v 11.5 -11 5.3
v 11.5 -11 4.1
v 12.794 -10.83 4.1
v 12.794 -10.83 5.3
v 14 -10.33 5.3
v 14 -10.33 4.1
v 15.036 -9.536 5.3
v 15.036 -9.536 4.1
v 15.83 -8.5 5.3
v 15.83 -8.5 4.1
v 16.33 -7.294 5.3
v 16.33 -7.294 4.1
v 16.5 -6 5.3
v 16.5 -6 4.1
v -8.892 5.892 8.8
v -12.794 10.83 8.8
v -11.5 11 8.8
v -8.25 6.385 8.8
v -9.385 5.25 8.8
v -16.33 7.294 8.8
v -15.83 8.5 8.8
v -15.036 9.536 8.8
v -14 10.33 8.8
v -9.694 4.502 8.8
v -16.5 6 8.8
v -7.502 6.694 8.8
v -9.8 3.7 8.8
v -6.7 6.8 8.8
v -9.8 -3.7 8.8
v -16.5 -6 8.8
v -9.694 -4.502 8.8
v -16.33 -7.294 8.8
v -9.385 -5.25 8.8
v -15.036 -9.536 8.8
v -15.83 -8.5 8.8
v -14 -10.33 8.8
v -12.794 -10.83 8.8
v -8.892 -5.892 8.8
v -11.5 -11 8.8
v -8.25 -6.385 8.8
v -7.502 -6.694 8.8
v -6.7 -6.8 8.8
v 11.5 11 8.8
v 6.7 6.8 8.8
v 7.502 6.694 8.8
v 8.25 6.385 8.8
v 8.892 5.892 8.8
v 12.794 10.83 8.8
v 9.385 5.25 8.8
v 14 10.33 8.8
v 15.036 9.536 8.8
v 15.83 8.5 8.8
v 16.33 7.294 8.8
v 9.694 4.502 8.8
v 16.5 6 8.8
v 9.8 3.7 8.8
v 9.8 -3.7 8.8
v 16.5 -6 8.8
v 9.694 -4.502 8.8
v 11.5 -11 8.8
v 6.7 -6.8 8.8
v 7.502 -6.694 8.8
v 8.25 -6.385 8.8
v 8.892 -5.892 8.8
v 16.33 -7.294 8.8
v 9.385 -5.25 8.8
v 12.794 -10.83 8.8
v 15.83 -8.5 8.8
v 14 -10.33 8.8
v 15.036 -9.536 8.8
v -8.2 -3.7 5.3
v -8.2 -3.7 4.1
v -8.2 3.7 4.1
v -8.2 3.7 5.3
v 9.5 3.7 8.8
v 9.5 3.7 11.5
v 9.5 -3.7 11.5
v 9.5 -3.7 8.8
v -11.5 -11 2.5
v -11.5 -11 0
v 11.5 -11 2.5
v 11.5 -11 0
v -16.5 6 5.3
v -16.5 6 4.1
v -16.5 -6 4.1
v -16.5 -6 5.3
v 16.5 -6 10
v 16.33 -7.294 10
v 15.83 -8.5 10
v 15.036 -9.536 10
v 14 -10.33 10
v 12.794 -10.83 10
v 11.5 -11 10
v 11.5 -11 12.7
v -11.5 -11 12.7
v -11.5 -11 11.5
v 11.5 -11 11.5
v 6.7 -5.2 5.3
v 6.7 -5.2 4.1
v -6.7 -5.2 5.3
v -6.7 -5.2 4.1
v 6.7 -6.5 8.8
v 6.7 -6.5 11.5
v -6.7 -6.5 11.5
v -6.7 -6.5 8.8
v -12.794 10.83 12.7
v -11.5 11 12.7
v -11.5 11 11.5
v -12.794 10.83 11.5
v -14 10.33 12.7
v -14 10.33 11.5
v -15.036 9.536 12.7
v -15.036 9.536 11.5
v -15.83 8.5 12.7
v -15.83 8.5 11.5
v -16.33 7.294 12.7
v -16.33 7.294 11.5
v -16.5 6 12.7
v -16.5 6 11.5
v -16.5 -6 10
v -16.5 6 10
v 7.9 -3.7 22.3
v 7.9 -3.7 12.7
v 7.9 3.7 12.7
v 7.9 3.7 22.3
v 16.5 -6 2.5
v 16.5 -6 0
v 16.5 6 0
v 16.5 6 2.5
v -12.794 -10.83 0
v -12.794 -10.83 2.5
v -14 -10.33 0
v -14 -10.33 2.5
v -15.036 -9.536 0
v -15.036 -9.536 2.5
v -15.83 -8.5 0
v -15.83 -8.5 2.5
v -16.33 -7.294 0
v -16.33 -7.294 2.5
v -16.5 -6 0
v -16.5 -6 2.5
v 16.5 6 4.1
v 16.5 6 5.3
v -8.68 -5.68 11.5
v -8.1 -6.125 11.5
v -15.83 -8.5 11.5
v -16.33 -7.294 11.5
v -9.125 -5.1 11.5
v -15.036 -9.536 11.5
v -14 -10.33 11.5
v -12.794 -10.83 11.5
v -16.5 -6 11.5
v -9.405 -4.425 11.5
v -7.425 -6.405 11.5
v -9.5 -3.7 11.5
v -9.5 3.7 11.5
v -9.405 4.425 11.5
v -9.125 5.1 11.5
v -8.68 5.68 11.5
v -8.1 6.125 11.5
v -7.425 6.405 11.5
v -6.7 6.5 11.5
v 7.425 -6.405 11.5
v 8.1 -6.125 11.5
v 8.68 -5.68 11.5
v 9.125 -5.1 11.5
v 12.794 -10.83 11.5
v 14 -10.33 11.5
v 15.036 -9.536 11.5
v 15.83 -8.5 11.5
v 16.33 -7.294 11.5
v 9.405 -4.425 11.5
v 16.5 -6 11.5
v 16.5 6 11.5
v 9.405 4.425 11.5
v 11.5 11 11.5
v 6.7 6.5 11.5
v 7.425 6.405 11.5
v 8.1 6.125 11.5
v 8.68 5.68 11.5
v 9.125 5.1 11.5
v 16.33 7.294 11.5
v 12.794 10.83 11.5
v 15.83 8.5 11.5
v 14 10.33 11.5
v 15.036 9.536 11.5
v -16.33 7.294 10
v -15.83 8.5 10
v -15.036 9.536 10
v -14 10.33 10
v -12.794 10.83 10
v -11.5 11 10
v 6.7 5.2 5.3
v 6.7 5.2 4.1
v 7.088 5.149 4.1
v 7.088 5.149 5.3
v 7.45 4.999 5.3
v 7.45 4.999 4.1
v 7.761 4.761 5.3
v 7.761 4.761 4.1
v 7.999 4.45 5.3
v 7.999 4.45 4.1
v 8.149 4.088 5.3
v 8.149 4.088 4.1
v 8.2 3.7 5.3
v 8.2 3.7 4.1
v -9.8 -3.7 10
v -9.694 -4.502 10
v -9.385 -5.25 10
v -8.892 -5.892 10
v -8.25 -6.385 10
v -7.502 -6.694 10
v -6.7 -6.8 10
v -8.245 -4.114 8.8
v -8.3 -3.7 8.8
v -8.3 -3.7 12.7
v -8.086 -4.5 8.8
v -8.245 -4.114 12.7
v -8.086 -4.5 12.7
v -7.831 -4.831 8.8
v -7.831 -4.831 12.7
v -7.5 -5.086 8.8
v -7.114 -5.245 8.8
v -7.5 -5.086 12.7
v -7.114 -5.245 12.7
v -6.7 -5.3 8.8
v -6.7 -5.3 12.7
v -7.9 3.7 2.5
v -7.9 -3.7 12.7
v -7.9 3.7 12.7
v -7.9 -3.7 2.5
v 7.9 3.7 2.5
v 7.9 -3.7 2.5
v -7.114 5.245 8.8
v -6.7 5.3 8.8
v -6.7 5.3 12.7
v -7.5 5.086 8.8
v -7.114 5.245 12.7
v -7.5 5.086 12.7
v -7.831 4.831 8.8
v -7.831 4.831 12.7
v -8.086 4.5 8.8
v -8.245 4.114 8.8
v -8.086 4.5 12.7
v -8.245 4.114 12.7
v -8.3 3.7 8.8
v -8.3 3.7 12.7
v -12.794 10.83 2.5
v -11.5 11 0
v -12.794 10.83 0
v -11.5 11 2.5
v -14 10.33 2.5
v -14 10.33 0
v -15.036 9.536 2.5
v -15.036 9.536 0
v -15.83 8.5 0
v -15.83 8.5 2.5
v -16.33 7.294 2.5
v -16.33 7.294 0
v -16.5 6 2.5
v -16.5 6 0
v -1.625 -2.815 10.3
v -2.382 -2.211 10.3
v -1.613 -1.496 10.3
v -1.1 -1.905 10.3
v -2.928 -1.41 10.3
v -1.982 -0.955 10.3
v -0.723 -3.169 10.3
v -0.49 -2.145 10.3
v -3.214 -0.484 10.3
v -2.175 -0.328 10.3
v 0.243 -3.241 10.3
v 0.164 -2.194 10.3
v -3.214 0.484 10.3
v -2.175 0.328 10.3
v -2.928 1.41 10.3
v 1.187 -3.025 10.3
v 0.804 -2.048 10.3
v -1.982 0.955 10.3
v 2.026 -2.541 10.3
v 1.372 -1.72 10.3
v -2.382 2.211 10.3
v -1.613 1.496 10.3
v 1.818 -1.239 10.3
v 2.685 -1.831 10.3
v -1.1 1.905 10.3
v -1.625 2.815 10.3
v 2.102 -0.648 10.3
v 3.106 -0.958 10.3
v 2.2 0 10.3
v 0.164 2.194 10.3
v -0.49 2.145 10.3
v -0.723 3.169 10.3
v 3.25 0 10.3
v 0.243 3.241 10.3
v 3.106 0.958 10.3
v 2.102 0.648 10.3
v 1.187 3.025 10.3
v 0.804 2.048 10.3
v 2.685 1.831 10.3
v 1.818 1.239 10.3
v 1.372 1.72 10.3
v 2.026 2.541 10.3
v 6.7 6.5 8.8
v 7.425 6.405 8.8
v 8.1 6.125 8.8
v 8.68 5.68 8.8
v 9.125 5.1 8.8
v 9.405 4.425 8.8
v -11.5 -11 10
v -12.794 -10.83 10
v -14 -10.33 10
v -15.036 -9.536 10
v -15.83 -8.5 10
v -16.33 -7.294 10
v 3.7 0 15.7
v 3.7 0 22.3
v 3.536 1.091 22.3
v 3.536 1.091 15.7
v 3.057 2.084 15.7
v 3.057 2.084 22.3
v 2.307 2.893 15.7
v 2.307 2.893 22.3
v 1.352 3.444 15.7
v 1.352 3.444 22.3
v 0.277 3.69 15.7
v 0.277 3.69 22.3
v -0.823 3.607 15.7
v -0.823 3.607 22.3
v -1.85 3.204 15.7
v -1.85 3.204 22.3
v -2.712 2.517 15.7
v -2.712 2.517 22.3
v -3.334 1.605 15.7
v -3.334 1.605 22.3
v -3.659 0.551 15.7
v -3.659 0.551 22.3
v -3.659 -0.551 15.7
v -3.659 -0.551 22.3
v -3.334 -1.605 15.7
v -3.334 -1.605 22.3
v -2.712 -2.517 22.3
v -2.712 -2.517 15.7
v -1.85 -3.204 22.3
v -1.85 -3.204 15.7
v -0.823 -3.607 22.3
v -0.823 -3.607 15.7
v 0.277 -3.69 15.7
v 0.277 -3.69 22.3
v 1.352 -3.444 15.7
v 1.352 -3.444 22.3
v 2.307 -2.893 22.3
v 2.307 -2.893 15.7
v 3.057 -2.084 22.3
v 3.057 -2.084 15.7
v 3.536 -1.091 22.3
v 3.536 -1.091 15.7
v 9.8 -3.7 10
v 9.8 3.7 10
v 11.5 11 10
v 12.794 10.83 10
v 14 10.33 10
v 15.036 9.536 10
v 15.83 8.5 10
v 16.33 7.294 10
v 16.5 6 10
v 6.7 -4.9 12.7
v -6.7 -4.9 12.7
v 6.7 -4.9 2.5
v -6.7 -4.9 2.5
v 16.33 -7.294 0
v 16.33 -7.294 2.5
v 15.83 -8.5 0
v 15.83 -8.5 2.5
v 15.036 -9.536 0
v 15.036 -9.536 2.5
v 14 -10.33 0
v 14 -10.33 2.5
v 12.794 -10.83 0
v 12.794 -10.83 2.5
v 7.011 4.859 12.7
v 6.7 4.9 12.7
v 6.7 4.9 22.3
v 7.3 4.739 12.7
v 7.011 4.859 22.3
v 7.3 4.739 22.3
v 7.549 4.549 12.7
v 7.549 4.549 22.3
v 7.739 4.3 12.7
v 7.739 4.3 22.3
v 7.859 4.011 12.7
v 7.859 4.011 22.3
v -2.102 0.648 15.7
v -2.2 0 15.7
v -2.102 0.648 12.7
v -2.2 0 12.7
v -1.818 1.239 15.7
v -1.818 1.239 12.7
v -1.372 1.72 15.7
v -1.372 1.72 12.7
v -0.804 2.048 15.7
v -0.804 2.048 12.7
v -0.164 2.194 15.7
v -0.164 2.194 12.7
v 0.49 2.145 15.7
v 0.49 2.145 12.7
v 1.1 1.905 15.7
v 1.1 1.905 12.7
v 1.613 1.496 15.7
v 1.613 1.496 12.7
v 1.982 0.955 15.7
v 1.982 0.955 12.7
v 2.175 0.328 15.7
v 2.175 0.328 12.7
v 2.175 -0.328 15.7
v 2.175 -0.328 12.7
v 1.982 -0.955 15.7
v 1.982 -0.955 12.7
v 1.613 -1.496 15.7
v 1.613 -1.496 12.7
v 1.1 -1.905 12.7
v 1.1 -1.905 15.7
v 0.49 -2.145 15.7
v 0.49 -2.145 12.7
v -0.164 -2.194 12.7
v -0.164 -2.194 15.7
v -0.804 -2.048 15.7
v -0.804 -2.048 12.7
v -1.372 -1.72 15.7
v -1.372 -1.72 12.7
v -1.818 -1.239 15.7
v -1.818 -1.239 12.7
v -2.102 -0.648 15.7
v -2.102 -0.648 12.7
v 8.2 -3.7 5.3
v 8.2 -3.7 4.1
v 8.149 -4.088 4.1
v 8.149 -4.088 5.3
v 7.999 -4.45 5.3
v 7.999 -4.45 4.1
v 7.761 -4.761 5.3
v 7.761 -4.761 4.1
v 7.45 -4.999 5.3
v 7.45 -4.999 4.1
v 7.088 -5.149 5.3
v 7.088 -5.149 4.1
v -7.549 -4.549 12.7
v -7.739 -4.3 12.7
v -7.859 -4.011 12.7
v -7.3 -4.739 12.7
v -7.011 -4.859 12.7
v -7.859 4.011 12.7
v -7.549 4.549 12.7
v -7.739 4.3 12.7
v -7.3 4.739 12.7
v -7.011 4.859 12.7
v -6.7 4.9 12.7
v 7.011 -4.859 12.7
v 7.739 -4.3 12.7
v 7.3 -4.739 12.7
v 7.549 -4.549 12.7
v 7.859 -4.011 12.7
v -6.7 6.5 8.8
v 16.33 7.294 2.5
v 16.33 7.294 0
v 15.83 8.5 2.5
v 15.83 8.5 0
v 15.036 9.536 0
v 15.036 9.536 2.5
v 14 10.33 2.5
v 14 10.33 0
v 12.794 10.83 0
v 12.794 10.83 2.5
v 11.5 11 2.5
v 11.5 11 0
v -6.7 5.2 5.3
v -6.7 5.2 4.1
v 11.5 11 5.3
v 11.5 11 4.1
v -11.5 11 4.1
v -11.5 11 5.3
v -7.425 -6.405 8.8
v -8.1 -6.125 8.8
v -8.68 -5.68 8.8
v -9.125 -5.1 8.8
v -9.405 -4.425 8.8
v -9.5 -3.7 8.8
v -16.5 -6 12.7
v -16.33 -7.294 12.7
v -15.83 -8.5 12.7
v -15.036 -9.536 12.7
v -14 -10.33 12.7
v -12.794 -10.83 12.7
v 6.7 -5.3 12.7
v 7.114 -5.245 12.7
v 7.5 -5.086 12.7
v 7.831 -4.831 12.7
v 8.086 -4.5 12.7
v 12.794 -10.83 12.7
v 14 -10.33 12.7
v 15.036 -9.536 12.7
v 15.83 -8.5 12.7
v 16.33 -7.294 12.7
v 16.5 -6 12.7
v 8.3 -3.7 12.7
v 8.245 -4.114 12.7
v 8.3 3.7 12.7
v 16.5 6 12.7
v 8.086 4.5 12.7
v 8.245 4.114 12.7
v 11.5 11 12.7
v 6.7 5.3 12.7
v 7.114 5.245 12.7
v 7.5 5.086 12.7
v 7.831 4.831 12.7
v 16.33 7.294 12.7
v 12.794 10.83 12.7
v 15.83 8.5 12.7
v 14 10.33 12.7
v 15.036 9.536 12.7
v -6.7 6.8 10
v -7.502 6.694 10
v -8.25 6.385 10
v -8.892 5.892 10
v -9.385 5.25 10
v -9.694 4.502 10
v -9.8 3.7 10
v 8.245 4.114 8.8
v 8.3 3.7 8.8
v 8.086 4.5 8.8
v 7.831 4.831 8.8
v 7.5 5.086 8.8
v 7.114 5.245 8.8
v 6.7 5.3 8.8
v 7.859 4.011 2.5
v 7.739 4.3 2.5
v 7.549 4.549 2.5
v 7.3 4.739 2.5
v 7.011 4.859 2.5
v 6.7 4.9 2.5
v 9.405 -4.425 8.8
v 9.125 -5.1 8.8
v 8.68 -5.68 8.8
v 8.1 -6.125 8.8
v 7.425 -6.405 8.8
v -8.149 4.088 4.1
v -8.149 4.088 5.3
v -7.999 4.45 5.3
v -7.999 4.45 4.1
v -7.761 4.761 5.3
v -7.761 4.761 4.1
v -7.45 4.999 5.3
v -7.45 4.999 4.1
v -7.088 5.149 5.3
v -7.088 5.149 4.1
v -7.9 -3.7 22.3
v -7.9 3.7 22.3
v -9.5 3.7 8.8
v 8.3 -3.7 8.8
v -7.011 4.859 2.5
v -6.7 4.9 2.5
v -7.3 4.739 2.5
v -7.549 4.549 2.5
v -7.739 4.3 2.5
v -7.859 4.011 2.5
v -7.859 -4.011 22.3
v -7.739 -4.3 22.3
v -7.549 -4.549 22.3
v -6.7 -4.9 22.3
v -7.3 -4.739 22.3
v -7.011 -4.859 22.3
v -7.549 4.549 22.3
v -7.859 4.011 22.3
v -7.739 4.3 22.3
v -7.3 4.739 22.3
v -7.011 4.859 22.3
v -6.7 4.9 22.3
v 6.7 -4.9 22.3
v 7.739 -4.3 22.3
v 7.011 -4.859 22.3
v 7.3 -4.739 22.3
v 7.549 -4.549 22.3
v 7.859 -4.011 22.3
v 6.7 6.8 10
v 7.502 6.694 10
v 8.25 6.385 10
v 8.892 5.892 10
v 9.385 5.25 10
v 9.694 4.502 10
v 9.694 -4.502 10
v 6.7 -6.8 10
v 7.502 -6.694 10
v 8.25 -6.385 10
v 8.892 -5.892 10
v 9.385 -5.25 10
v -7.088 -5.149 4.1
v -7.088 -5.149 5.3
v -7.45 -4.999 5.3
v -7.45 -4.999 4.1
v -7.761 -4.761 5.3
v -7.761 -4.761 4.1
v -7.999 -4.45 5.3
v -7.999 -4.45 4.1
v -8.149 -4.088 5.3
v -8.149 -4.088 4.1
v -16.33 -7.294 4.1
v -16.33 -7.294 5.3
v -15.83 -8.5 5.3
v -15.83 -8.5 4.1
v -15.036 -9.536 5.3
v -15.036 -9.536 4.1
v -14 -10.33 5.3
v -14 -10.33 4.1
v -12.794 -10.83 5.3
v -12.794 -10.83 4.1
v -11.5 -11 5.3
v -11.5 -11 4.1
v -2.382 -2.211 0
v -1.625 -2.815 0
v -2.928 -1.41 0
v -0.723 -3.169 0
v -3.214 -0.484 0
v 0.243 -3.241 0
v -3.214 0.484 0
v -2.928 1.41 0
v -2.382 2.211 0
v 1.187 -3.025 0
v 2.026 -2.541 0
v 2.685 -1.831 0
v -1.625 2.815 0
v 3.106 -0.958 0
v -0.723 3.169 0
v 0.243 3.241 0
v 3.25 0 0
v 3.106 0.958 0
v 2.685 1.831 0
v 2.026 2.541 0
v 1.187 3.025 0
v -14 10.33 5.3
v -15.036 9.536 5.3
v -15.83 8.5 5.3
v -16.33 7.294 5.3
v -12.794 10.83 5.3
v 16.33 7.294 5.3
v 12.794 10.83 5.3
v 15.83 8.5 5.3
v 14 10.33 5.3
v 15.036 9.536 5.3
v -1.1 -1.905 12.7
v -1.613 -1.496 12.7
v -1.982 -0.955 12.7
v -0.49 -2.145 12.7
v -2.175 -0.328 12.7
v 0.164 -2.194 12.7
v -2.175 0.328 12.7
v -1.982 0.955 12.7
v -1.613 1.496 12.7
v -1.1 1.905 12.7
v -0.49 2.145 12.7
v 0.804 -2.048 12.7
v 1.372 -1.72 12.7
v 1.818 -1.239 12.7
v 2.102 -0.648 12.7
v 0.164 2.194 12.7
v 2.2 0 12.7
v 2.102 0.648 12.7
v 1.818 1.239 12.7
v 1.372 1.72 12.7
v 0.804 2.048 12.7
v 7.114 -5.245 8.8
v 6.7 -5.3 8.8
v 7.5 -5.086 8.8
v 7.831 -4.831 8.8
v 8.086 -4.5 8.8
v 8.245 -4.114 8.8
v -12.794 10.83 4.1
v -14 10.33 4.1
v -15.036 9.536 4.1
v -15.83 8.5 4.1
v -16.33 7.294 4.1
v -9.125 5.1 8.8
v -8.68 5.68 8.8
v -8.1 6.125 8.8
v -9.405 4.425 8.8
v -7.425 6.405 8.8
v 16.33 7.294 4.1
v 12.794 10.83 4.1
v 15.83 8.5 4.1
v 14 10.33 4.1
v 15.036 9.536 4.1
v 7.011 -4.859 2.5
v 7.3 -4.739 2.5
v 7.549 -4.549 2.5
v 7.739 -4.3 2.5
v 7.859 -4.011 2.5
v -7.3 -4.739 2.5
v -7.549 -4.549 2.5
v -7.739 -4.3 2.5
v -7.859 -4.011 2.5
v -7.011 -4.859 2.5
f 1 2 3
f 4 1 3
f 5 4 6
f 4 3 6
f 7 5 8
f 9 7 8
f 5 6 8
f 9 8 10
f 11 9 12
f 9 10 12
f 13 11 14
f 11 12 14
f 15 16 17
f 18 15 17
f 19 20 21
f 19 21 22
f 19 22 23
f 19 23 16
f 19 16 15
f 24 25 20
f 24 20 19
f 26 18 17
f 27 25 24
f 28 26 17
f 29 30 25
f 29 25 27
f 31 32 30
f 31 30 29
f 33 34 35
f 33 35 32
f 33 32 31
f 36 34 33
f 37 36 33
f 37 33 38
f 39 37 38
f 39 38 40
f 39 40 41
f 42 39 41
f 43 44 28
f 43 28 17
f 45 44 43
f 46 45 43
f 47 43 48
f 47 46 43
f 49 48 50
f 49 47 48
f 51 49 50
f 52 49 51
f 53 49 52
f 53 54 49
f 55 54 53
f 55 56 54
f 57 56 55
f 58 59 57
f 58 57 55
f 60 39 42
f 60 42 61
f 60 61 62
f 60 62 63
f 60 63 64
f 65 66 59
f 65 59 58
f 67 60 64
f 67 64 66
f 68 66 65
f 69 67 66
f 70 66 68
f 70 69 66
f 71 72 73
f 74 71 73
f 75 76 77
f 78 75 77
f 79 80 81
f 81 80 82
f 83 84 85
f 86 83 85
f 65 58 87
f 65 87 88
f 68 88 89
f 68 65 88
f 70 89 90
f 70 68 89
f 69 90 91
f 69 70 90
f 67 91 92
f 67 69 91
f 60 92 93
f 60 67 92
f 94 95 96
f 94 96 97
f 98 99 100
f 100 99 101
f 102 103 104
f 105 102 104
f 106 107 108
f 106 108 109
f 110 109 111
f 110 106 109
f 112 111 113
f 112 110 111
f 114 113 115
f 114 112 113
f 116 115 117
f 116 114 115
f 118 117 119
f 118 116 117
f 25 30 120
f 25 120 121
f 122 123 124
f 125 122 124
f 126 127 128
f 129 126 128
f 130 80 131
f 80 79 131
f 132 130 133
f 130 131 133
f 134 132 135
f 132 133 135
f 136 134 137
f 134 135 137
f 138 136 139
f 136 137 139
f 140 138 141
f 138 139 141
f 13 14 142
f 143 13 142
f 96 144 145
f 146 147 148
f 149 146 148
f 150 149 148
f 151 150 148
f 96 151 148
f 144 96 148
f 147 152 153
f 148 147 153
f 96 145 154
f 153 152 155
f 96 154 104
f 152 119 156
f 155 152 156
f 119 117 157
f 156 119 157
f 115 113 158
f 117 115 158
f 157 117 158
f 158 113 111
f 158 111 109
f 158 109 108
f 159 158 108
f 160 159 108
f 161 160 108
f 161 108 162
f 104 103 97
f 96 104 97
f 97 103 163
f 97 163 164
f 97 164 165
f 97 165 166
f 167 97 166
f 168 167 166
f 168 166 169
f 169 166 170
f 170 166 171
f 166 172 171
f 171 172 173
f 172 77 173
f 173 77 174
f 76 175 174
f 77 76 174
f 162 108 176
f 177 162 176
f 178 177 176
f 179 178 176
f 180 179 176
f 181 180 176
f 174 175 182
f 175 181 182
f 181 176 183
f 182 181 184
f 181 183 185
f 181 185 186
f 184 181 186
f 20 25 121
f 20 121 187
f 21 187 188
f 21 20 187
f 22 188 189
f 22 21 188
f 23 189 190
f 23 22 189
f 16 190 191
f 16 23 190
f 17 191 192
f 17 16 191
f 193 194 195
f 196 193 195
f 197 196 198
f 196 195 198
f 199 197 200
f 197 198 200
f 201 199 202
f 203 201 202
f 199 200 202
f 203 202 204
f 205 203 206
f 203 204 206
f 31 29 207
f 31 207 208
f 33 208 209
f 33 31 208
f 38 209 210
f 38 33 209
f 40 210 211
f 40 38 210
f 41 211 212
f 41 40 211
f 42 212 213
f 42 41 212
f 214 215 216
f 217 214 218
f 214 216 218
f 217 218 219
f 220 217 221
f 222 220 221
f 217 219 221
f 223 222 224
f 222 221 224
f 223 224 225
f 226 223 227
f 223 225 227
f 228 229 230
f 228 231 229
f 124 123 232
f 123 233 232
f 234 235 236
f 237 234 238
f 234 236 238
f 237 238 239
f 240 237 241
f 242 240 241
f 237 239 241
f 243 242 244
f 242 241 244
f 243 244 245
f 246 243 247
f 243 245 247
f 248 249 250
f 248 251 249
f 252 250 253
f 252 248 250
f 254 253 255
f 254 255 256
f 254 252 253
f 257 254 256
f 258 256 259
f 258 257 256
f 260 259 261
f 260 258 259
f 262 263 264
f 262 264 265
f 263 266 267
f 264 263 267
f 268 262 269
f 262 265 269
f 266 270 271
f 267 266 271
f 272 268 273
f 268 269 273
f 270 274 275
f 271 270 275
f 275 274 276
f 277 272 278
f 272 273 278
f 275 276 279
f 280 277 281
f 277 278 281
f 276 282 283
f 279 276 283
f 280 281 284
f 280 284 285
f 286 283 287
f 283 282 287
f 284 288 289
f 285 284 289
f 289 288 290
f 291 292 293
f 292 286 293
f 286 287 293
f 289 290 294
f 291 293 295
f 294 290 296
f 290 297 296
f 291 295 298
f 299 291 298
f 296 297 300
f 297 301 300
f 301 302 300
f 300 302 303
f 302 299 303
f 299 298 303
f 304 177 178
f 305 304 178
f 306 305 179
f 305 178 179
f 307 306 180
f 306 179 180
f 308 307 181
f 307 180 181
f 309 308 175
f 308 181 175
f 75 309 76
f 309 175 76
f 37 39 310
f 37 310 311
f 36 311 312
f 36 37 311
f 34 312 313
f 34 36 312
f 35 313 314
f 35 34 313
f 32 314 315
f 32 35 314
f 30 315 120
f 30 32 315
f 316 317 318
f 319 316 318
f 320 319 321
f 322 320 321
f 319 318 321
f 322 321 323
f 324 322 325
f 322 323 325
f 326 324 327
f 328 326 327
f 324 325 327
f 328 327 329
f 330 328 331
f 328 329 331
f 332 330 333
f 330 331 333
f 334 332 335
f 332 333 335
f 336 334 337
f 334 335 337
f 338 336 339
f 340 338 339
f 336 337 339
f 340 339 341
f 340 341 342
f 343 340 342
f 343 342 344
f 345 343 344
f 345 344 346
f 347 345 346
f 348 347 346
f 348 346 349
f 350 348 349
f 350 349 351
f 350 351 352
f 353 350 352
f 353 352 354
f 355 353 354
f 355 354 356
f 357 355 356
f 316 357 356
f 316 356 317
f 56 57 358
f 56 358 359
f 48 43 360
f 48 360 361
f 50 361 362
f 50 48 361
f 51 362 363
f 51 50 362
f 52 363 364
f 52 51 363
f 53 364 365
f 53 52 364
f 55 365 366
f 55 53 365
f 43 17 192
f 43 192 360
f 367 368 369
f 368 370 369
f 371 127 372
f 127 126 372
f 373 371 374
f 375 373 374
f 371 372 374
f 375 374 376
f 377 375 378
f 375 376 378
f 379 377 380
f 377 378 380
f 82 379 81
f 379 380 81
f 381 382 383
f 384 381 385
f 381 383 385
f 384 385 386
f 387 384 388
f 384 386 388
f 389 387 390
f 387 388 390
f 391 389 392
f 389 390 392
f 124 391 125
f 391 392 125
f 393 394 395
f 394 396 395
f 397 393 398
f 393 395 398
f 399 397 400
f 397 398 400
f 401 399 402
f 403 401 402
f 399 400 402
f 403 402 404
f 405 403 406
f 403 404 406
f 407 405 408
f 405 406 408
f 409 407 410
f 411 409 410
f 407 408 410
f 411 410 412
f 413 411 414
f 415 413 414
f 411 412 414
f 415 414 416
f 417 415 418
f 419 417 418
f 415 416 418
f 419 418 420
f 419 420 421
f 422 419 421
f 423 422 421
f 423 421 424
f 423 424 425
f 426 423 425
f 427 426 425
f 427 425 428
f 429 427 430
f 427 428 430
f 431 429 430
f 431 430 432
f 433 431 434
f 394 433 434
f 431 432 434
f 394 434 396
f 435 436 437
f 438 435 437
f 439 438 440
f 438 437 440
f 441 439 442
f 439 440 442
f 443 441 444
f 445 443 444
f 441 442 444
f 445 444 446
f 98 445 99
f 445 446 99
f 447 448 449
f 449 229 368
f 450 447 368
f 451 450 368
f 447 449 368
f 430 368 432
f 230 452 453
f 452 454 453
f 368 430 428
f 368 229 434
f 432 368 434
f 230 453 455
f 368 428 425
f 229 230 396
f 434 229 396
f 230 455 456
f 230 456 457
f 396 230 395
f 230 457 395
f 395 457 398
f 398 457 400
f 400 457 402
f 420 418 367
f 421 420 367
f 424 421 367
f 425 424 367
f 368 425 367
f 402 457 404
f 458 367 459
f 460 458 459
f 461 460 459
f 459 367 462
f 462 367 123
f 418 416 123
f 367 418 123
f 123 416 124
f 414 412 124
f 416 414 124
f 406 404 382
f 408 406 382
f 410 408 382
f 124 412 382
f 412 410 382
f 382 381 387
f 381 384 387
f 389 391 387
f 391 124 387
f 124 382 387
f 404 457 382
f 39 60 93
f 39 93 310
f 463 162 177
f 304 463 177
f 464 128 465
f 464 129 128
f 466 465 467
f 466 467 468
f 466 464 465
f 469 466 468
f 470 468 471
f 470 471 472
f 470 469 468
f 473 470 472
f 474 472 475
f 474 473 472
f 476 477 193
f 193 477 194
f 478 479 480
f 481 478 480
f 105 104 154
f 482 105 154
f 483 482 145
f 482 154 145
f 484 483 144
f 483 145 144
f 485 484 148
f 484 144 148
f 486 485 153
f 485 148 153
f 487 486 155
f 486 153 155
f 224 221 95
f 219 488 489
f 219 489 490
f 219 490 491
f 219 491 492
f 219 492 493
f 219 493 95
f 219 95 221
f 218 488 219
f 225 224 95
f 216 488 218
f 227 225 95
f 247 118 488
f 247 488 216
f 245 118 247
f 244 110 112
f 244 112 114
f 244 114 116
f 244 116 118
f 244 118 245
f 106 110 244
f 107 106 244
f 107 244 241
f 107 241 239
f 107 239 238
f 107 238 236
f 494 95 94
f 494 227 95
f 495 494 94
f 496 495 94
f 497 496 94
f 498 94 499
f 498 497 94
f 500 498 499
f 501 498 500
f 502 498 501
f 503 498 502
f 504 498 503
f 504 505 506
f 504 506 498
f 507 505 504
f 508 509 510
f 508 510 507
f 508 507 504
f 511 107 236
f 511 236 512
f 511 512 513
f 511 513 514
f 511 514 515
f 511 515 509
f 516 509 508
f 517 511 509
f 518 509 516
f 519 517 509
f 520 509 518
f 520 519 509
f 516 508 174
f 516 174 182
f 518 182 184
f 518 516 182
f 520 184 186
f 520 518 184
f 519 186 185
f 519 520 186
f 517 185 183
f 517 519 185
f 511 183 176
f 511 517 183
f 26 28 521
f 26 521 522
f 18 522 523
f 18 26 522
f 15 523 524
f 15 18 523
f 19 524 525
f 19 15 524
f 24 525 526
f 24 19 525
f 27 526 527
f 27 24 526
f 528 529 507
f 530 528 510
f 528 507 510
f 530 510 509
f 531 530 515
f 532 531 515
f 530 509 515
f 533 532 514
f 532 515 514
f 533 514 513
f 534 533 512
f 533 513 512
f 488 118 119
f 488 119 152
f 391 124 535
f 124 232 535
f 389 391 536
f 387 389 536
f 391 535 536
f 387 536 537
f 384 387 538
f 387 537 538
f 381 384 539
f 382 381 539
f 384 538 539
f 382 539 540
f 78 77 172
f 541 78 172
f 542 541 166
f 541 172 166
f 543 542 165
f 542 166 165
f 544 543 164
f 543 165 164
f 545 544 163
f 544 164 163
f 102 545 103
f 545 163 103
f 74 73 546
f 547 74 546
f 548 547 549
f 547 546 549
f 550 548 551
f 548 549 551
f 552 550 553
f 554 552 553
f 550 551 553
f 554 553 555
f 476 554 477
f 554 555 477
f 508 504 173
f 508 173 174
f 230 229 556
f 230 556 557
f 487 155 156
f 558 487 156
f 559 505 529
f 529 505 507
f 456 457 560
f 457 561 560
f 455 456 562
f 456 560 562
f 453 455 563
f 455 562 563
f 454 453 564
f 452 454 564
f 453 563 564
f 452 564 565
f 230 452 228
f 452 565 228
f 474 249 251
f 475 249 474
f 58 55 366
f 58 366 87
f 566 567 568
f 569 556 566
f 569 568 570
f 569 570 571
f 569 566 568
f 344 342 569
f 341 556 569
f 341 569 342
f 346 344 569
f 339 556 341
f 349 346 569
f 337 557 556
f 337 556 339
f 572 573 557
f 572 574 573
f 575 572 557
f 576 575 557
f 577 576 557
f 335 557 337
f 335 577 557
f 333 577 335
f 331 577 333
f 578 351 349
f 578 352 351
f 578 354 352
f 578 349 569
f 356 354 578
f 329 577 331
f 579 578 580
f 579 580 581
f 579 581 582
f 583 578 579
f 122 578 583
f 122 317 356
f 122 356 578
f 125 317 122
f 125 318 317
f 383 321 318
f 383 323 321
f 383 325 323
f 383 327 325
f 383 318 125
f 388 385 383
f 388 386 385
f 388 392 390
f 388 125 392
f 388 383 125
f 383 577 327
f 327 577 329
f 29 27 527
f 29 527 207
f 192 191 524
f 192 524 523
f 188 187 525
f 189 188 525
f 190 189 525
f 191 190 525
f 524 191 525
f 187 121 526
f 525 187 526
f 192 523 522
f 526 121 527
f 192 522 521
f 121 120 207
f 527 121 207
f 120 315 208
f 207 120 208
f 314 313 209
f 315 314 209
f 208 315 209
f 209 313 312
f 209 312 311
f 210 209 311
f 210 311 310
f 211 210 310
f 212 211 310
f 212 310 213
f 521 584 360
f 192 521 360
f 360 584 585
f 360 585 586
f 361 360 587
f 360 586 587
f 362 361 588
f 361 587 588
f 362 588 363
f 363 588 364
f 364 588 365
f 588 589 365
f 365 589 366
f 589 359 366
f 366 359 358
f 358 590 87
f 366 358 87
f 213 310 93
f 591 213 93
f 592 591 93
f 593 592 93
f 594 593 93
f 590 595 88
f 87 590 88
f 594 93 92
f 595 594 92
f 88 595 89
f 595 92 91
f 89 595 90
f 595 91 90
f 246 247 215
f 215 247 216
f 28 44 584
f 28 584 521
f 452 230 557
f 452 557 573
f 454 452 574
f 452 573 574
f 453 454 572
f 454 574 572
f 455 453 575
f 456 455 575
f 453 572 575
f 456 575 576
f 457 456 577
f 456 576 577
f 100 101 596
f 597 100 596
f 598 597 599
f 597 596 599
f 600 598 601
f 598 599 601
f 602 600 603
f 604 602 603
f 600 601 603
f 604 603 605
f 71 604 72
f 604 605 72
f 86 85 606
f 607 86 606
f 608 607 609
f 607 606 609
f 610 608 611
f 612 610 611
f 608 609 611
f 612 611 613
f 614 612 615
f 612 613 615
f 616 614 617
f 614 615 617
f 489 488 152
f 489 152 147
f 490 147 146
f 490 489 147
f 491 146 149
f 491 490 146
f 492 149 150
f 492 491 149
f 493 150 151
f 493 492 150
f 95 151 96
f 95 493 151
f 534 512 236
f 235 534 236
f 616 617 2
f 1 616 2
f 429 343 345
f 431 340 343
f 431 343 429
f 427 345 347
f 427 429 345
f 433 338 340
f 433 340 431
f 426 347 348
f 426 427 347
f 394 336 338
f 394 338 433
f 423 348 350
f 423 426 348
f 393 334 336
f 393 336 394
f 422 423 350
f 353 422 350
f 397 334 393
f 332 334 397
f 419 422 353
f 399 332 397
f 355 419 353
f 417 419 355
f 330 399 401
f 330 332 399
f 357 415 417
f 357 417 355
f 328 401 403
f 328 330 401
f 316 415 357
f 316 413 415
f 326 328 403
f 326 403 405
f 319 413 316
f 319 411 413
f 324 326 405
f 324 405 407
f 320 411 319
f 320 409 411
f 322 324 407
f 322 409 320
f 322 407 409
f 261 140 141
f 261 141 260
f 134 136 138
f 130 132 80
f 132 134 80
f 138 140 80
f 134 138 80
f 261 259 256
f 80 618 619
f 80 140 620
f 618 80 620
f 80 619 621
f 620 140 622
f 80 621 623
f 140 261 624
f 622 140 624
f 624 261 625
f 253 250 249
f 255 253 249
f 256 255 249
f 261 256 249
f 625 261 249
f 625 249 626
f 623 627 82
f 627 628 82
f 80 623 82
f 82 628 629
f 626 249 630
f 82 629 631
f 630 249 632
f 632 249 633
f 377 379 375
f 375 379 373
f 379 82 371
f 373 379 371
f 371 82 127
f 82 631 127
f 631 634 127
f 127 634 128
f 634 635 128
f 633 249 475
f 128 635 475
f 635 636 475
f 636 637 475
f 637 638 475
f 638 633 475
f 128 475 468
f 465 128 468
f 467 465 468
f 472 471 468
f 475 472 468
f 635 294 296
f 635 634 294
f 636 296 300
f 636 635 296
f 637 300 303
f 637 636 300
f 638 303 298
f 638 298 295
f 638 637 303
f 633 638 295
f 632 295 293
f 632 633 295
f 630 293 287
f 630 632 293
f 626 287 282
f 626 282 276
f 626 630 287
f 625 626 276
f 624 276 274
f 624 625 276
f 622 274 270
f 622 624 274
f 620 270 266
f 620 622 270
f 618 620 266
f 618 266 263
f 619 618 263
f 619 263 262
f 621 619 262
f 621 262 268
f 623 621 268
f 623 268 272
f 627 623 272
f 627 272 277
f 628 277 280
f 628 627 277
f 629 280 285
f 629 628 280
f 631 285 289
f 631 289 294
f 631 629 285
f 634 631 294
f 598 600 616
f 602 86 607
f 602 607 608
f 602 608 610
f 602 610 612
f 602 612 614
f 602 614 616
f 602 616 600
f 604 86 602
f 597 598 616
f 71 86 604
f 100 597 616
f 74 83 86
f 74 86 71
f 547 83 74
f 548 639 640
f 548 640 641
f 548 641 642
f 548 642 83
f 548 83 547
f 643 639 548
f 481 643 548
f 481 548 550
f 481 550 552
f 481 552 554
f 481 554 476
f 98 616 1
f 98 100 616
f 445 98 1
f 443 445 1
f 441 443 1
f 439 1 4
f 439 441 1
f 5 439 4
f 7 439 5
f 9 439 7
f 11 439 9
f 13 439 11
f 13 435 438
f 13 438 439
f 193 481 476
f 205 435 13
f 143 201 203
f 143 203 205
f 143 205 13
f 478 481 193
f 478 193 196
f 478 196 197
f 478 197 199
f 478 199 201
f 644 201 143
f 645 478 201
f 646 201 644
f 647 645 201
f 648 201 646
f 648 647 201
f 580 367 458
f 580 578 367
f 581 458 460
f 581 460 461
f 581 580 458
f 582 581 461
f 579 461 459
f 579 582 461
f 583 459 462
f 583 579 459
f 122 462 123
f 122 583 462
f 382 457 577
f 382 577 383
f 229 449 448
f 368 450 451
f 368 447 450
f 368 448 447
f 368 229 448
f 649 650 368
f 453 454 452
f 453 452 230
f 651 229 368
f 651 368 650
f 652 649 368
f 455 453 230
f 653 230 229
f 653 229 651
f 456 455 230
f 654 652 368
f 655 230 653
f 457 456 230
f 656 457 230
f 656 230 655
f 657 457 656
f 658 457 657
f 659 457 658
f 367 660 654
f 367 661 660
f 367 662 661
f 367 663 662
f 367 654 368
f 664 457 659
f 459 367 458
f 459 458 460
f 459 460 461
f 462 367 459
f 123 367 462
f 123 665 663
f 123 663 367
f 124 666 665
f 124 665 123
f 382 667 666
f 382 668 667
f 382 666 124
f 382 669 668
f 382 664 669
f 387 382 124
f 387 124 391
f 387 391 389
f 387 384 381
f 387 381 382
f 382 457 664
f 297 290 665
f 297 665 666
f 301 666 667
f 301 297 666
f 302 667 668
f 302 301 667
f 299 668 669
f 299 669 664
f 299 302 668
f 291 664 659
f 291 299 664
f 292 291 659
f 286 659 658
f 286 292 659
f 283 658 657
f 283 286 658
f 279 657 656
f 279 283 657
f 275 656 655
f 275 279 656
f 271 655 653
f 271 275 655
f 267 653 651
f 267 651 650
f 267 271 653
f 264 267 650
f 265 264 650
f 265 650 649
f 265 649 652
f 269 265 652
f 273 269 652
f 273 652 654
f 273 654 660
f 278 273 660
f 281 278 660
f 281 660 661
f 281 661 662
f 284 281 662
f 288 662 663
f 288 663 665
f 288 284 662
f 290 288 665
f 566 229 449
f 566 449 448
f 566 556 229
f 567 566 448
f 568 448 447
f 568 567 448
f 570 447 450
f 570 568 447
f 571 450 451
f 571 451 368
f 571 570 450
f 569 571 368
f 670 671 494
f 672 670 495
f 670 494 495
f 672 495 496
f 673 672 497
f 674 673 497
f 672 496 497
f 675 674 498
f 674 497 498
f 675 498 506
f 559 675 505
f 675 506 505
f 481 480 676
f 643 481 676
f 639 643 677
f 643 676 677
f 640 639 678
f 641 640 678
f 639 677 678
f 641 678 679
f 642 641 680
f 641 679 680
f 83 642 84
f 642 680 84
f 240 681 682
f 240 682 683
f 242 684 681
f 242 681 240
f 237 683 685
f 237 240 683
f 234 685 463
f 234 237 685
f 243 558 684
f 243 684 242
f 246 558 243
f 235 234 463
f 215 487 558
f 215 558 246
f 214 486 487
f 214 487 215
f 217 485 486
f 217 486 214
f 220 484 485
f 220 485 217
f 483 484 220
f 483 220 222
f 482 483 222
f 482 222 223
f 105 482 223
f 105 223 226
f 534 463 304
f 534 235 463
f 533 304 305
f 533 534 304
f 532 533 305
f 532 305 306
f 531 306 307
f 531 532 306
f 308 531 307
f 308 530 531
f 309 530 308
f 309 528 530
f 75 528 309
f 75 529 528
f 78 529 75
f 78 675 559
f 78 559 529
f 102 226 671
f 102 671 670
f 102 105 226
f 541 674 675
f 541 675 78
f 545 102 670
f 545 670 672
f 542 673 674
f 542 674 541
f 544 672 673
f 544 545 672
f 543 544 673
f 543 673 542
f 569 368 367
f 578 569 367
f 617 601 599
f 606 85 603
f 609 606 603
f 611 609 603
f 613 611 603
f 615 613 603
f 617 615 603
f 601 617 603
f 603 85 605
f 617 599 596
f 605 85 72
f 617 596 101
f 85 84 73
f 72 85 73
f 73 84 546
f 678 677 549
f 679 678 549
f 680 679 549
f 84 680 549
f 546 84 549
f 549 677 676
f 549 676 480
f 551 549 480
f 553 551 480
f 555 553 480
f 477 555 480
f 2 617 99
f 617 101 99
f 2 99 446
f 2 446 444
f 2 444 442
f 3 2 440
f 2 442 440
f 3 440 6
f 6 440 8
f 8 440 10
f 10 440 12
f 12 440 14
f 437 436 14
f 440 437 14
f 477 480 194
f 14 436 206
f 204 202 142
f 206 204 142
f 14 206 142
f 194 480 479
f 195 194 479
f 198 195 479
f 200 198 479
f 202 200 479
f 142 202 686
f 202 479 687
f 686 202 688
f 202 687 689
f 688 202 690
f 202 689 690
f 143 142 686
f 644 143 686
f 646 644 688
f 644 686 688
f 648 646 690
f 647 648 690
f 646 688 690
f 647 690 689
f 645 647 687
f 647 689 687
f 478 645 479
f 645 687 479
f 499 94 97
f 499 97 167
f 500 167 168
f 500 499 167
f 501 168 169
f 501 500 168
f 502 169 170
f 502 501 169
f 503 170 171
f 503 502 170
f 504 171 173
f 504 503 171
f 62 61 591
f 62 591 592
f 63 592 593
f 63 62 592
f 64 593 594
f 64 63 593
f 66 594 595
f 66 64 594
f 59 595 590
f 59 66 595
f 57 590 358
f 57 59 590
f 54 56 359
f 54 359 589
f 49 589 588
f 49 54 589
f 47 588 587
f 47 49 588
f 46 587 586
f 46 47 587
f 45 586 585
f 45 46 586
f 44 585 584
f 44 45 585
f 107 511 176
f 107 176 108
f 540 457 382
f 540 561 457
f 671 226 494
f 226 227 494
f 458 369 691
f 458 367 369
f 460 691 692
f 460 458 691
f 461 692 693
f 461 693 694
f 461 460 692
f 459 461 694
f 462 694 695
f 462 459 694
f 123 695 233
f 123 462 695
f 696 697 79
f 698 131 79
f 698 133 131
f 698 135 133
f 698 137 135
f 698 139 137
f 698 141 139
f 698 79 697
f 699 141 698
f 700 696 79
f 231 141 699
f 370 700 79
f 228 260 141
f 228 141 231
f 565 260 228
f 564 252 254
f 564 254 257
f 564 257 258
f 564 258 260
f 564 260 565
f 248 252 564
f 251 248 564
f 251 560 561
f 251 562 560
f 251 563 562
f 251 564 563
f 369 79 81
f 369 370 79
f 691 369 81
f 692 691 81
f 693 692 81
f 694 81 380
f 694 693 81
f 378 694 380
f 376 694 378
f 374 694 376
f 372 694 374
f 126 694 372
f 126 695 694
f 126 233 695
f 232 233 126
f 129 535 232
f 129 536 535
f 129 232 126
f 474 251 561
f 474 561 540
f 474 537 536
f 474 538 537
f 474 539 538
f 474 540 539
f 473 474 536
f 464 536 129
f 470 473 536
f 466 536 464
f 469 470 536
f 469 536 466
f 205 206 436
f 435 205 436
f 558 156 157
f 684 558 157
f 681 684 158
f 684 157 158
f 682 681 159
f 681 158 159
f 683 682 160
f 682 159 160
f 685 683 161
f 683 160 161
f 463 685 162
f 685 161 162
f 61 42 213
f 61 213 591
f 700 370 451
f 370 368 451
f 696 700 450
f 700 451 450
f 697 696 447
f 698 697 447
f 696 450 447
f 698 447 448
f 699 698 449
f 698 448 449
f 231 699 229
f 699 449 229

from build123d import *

# Parameters (mm, degrees)
F0_W           = 33
F0_H           = 22
F0_R           = 3.25
F1_DEPTH       = 2.5
F2_W           = 15.8
F2_H           = 9.8
F2_R           = 3.25
F3_DEPTH       = 7.8
F4_W           = 15.8
F4_H           = 9.8
F4_R           = 2.2
F5_DEPTH       = 2.4
F6_W           = 15.8
F6_H           = 9.8
F7_DEPTH       = 9.6
F9_D           = 4.4
F9_CBORE_D     = 7.4
F9_CBORE_DEPTH = 6.6
F10_R          = 5
F11_R          = 1.2
F11_2_R        = 1.2
F13_DEPTH      = 1.2
F15_DEPTH      = 2.7
F17_DEPTH      = 1.2
F20_DEPTH      = 1.2


with BuildPart() as f1:
    # F0 (on Top) → F1 (new body)
    with BuildSketch(Plane.XY):
        Rectangle(F0_W, F0_H)
        Circle(F0_R, mode=Mode.SUBTRACT)
    extrude(amount=F1_DEPTH)

    # F2 (on face) → F3 (join)
    with BuildSketch(Plane.XY.offset(2.5)):
        Rectangle(F2_W, F2_H)
        Circle(F2_R, mode=Mode.SUBTRACT)
    extrude(amount=F3_DEPTH)

    # F4 (on face) → F5 (join)
    with BuildSketch(Plane.XY.offset(10.3)):
        Rectangle(F4_W, F4_H)
        Circle(F4_R, mode=Mode.SUBTRACT)
    extrude(amount=F5_DEPTH)

    # F10
    f10_edges = [f1.edges().sort_by_distance(p)[0] for p in [
        (16.5, -11, 1.25),
        (16.5, 11, 1.25),
        (-16.5, -11, 1.25),
        (-16.5, 11, 1.25),
    ]]
    fillet(f10_edges, radius=F10_R)

    # F11
    f11_edges = [f1.edges().sort_by_distance(p)[0] for p in [
        (-7.9, 4.9, 7.6),
        (-7.9, -4.9, 7.6),
        (7.9, 4.9, 7.6),
        (7.9, -4.9, 7.6),
    ]]
    fillet(f11_edges, radius=F11_R)


with BuildPart() as f7:
    # F6 (on face) → F7 (new body)
    with BuildSketch(Plane.XY.offset(12.7)):
        Rectangle(F6_W, F6_H)
    extrude(amount=F7_DEPTH)

    # F9 (through all)
    with Locations(Plane.XY.offset(22.3)):
        with Locations((0, 0)):
            CounterBoreHole(F9_D / 2, F9_CBORE_D / 2, F9_CBORE_DEPTH)

    # F11#2
    f11_2_edges = [f7.edges().sort_by_distance(p)[0] for p in [
        (7.9, 4.9, 17.5),
        (7.9, -4.9, 17.5),
        (-7.9, 4.9, 17.5),
        (-7.9, -4.9, 17.5),
    ]]
    fillet(f11_2_edges, radius=F11_2_R)


with BuildPart() as f13:
    # F12 (on face) → F13 (new body)
    with BuildSketch(Plane.XY.offset(12.7)):
        with BuildLine():
            Line((11.5, 11), (-11.5, 11))
            ThreePointArc((-11.5, 11), (-15.035534, 9.535534), (-16.5, 6))
            Line((-16.5, 6), (-16.5, -6))
            ThreePointArc((-16.5, -6), (-15.035534, -9.535534), (-11.5, -11))
            Line((-11.5, -11), (11.5, -11))
            ThreePointArc((11.5, -11), (15.035534, -9.535534), (16.5, -6))
            Line((16.5, -6), (16.5, 6))
            ThreePointArc((16.5, 6), (15.035534, 9.535534), (11.5, 11))
        make_face()
        with BuildLine():
            Line((-6.7, 5.3), (6.7, 5.3))
            ThreePointArc((6.7, 5.3), (7.831371, 4.831371), (8.3, 3.7))
            Line((8.3, 3.7), (8.3, -3.7))
            ThreePointArc((8.3, -3.7), (7.831371, -4.831371), (6.7, -5.3))
            Line((6.7, -5.3), (-6.7, -5.3))
            ThreePointArc((-6.7, -5.3), (-7.831371, -4.831371), (-8.3, -3.7))
            Line((-8.3, -3.7), (-8.3, 3.7))
            ThreePointArc((-8.3, 3.7), (-7.831371, 4.831371), (-6.7, 5.3))
        make_face(mode=Mode.SUBTRACT)
    extrude(amount=-F13_DEPTH)

    # F14 (on face) → F15 (join)
    with BuildSketch(Plane(origin=(0, 0, 11.5), x_dir=(1, 0, 0), z_dir=(0, 0, -1))):
        with BuildLine():
            ThreePointArc((-6.7, 6.5), (-8.679899, 5.679899), (-9.5, 3.7))
            Line((-9.5, 3.7), (-9.5, -3.7))
            ThreePointArc((-9.5, -3.7), (-8.679899, -5.679899), (-6.7, -6.5))
            Line((-6.7, -6.5), (6.7, -6.5))
            ThreePointArc((6.7, -6.5), (8.679899, -5.679899), (9.5, -3.7))
            Line((9.5, -3.7), (9.5, 3.7))
            ThreePointArc((9.5, 3.7), (8.679899, 5.679899), (6.7, 6.5))
            Line((6.7, 6.5), (-6.7, 6.5))
        make_face()
        with BuildLine():
            Line((-6.7, 5.3), (6.7, 5.3))
            ThreePointArc((6.7, 5.3), (7.831371, 4.831371), (8.3, 3.7))
            Line((8.3, 3.7), (8.3, -3.7))
            ThreePointArc((8.3, -3.7), (7.831371, -4.831371), (6.7, -5.3))
            Line((6.7, -5.3), (-6.7, -5.3))
            ThreePointArc((-6.7, -5.3), (-7.831371, -4.831371), (-8.3, -3.7))
            Line((-8.3, -3.7), (-8.3, 3.7))
            ThreePointArc((-8.3, 3.7), (-7.831371, 4.831371), (-6.7, 5.3))
        make_face(mode=Mode.SUBTRACT)
    extrude(amount=F15_DEPTH)


with BuildPart() as f17:
    # F16 (on face) → F17 (new body)
    with BuildSketch(Plane(origin=(0, 0, 8.8), x_dir=(1, 0, 0), z_dir=(0, 0, -1))):
        with BuildLine():
            ThreePointArc((-11.5, 11), (-15.035534, 9.535534), (-16.5, 6))
            Line((-16.5, 6), (-16.5, -6))
            ThreePointArc((-16.5, -6), (-15.035534, -9.535534), (-11.5, -11))
            Line((-11.5, -11), (11.5, -11))
            ThreePointArc((11.5, -11), (15.035534, -9.535534), (16.5, -6))
            Line((16.5, -6), (16.5, 6))
            ThreePointArc((16.5, 6), (15.035534, 9.535534), (11.5, 11))
            Line((11.5, 11), (-11.5, 11))
        make_face()
        with BuildLine():
            Line((-6.7, 6.8), (6.7, 6.8))
            ThreePointArc((6.7, 6.8), (8.892031, 5.892031), (9.8, 3.7))
            Line((9.8, 3.7), (9.8, -3.7))
            ThreePointArc((9.8, -3.7), (8.892031, -5.892031), (6.7, -6.8))
            Line((6.7, -6.8), (-6.7, -6.8))
            ThreePointArc((-6.7, -6.8), (-8.892031, -5.892031), (-9.8, -3.7))
            Line((-9.8, -3.7), (-9.8, 3.7))
            ThreePointArc((-9.8, 3.7), (-8.892031, 5.892031), (-6.7, 6.8))
        make_face(mode=Mode.SUBTRACT)
    extrude(amount=-F17_DEPTH)


with BuildPart() as f20:
    # F19 (on offset) → F20 (new body)
    with BuildSketch(Plane.XY.offset(4.1)):
        with BuildLine():
            Line((11.5, 11), (-11.5, 11))
            ThreePointArc((-11.5, 11), (-15.035534, 9.535534), (-16.5, 6))
            Line((-16.5, 6), (-16.5, -6))
            ThreePointArc((-16.5, -6), (-15.035534, -9.535534), (-11.5, -11))
            Line((-11.5, -11), (11.5, -11))
            ThreePointArc((11.5, -11), (15.035534, -9.535534), (16.5, -6))
            Line((16.5, -6), (16.5, 6))
            ThreePointArc((16.5, 6), (15.035534, 9.535534), (11.5, 11))
        make_face()
        with BuildLine():
            Line((-6.7, 5.2), (6.7, 5.2))
            ThreePointArc((6.7, 5.2), (7.76066, 4.76066), (8.2, 3.7))
            Line((8.2, 3.7), (8.2, -3.7))
            ThreePointArc((8.2, -3.7), (7.76066, -4.76066), (6.7, -5.2))
            Line((6.7, -5.2), (-6.7, -5.2))
            ThreePointArc((-6.7, -5.2), (-7.76066, -4.76066), (-8.2, -3.7))
            Line((-8.2, -3.7), (-8.2, 3.7))
            ThreePointArc((-8.2, 3.7), (-7.76066, 4.76066), (-6.7, 5.2))
        make_face(mode=Mode.SUBTRACT)
    extrude(amount=F20_DEPTH)


solid = Compound([f1.part, f7.part, f13.part, f17.part, f20.part])
